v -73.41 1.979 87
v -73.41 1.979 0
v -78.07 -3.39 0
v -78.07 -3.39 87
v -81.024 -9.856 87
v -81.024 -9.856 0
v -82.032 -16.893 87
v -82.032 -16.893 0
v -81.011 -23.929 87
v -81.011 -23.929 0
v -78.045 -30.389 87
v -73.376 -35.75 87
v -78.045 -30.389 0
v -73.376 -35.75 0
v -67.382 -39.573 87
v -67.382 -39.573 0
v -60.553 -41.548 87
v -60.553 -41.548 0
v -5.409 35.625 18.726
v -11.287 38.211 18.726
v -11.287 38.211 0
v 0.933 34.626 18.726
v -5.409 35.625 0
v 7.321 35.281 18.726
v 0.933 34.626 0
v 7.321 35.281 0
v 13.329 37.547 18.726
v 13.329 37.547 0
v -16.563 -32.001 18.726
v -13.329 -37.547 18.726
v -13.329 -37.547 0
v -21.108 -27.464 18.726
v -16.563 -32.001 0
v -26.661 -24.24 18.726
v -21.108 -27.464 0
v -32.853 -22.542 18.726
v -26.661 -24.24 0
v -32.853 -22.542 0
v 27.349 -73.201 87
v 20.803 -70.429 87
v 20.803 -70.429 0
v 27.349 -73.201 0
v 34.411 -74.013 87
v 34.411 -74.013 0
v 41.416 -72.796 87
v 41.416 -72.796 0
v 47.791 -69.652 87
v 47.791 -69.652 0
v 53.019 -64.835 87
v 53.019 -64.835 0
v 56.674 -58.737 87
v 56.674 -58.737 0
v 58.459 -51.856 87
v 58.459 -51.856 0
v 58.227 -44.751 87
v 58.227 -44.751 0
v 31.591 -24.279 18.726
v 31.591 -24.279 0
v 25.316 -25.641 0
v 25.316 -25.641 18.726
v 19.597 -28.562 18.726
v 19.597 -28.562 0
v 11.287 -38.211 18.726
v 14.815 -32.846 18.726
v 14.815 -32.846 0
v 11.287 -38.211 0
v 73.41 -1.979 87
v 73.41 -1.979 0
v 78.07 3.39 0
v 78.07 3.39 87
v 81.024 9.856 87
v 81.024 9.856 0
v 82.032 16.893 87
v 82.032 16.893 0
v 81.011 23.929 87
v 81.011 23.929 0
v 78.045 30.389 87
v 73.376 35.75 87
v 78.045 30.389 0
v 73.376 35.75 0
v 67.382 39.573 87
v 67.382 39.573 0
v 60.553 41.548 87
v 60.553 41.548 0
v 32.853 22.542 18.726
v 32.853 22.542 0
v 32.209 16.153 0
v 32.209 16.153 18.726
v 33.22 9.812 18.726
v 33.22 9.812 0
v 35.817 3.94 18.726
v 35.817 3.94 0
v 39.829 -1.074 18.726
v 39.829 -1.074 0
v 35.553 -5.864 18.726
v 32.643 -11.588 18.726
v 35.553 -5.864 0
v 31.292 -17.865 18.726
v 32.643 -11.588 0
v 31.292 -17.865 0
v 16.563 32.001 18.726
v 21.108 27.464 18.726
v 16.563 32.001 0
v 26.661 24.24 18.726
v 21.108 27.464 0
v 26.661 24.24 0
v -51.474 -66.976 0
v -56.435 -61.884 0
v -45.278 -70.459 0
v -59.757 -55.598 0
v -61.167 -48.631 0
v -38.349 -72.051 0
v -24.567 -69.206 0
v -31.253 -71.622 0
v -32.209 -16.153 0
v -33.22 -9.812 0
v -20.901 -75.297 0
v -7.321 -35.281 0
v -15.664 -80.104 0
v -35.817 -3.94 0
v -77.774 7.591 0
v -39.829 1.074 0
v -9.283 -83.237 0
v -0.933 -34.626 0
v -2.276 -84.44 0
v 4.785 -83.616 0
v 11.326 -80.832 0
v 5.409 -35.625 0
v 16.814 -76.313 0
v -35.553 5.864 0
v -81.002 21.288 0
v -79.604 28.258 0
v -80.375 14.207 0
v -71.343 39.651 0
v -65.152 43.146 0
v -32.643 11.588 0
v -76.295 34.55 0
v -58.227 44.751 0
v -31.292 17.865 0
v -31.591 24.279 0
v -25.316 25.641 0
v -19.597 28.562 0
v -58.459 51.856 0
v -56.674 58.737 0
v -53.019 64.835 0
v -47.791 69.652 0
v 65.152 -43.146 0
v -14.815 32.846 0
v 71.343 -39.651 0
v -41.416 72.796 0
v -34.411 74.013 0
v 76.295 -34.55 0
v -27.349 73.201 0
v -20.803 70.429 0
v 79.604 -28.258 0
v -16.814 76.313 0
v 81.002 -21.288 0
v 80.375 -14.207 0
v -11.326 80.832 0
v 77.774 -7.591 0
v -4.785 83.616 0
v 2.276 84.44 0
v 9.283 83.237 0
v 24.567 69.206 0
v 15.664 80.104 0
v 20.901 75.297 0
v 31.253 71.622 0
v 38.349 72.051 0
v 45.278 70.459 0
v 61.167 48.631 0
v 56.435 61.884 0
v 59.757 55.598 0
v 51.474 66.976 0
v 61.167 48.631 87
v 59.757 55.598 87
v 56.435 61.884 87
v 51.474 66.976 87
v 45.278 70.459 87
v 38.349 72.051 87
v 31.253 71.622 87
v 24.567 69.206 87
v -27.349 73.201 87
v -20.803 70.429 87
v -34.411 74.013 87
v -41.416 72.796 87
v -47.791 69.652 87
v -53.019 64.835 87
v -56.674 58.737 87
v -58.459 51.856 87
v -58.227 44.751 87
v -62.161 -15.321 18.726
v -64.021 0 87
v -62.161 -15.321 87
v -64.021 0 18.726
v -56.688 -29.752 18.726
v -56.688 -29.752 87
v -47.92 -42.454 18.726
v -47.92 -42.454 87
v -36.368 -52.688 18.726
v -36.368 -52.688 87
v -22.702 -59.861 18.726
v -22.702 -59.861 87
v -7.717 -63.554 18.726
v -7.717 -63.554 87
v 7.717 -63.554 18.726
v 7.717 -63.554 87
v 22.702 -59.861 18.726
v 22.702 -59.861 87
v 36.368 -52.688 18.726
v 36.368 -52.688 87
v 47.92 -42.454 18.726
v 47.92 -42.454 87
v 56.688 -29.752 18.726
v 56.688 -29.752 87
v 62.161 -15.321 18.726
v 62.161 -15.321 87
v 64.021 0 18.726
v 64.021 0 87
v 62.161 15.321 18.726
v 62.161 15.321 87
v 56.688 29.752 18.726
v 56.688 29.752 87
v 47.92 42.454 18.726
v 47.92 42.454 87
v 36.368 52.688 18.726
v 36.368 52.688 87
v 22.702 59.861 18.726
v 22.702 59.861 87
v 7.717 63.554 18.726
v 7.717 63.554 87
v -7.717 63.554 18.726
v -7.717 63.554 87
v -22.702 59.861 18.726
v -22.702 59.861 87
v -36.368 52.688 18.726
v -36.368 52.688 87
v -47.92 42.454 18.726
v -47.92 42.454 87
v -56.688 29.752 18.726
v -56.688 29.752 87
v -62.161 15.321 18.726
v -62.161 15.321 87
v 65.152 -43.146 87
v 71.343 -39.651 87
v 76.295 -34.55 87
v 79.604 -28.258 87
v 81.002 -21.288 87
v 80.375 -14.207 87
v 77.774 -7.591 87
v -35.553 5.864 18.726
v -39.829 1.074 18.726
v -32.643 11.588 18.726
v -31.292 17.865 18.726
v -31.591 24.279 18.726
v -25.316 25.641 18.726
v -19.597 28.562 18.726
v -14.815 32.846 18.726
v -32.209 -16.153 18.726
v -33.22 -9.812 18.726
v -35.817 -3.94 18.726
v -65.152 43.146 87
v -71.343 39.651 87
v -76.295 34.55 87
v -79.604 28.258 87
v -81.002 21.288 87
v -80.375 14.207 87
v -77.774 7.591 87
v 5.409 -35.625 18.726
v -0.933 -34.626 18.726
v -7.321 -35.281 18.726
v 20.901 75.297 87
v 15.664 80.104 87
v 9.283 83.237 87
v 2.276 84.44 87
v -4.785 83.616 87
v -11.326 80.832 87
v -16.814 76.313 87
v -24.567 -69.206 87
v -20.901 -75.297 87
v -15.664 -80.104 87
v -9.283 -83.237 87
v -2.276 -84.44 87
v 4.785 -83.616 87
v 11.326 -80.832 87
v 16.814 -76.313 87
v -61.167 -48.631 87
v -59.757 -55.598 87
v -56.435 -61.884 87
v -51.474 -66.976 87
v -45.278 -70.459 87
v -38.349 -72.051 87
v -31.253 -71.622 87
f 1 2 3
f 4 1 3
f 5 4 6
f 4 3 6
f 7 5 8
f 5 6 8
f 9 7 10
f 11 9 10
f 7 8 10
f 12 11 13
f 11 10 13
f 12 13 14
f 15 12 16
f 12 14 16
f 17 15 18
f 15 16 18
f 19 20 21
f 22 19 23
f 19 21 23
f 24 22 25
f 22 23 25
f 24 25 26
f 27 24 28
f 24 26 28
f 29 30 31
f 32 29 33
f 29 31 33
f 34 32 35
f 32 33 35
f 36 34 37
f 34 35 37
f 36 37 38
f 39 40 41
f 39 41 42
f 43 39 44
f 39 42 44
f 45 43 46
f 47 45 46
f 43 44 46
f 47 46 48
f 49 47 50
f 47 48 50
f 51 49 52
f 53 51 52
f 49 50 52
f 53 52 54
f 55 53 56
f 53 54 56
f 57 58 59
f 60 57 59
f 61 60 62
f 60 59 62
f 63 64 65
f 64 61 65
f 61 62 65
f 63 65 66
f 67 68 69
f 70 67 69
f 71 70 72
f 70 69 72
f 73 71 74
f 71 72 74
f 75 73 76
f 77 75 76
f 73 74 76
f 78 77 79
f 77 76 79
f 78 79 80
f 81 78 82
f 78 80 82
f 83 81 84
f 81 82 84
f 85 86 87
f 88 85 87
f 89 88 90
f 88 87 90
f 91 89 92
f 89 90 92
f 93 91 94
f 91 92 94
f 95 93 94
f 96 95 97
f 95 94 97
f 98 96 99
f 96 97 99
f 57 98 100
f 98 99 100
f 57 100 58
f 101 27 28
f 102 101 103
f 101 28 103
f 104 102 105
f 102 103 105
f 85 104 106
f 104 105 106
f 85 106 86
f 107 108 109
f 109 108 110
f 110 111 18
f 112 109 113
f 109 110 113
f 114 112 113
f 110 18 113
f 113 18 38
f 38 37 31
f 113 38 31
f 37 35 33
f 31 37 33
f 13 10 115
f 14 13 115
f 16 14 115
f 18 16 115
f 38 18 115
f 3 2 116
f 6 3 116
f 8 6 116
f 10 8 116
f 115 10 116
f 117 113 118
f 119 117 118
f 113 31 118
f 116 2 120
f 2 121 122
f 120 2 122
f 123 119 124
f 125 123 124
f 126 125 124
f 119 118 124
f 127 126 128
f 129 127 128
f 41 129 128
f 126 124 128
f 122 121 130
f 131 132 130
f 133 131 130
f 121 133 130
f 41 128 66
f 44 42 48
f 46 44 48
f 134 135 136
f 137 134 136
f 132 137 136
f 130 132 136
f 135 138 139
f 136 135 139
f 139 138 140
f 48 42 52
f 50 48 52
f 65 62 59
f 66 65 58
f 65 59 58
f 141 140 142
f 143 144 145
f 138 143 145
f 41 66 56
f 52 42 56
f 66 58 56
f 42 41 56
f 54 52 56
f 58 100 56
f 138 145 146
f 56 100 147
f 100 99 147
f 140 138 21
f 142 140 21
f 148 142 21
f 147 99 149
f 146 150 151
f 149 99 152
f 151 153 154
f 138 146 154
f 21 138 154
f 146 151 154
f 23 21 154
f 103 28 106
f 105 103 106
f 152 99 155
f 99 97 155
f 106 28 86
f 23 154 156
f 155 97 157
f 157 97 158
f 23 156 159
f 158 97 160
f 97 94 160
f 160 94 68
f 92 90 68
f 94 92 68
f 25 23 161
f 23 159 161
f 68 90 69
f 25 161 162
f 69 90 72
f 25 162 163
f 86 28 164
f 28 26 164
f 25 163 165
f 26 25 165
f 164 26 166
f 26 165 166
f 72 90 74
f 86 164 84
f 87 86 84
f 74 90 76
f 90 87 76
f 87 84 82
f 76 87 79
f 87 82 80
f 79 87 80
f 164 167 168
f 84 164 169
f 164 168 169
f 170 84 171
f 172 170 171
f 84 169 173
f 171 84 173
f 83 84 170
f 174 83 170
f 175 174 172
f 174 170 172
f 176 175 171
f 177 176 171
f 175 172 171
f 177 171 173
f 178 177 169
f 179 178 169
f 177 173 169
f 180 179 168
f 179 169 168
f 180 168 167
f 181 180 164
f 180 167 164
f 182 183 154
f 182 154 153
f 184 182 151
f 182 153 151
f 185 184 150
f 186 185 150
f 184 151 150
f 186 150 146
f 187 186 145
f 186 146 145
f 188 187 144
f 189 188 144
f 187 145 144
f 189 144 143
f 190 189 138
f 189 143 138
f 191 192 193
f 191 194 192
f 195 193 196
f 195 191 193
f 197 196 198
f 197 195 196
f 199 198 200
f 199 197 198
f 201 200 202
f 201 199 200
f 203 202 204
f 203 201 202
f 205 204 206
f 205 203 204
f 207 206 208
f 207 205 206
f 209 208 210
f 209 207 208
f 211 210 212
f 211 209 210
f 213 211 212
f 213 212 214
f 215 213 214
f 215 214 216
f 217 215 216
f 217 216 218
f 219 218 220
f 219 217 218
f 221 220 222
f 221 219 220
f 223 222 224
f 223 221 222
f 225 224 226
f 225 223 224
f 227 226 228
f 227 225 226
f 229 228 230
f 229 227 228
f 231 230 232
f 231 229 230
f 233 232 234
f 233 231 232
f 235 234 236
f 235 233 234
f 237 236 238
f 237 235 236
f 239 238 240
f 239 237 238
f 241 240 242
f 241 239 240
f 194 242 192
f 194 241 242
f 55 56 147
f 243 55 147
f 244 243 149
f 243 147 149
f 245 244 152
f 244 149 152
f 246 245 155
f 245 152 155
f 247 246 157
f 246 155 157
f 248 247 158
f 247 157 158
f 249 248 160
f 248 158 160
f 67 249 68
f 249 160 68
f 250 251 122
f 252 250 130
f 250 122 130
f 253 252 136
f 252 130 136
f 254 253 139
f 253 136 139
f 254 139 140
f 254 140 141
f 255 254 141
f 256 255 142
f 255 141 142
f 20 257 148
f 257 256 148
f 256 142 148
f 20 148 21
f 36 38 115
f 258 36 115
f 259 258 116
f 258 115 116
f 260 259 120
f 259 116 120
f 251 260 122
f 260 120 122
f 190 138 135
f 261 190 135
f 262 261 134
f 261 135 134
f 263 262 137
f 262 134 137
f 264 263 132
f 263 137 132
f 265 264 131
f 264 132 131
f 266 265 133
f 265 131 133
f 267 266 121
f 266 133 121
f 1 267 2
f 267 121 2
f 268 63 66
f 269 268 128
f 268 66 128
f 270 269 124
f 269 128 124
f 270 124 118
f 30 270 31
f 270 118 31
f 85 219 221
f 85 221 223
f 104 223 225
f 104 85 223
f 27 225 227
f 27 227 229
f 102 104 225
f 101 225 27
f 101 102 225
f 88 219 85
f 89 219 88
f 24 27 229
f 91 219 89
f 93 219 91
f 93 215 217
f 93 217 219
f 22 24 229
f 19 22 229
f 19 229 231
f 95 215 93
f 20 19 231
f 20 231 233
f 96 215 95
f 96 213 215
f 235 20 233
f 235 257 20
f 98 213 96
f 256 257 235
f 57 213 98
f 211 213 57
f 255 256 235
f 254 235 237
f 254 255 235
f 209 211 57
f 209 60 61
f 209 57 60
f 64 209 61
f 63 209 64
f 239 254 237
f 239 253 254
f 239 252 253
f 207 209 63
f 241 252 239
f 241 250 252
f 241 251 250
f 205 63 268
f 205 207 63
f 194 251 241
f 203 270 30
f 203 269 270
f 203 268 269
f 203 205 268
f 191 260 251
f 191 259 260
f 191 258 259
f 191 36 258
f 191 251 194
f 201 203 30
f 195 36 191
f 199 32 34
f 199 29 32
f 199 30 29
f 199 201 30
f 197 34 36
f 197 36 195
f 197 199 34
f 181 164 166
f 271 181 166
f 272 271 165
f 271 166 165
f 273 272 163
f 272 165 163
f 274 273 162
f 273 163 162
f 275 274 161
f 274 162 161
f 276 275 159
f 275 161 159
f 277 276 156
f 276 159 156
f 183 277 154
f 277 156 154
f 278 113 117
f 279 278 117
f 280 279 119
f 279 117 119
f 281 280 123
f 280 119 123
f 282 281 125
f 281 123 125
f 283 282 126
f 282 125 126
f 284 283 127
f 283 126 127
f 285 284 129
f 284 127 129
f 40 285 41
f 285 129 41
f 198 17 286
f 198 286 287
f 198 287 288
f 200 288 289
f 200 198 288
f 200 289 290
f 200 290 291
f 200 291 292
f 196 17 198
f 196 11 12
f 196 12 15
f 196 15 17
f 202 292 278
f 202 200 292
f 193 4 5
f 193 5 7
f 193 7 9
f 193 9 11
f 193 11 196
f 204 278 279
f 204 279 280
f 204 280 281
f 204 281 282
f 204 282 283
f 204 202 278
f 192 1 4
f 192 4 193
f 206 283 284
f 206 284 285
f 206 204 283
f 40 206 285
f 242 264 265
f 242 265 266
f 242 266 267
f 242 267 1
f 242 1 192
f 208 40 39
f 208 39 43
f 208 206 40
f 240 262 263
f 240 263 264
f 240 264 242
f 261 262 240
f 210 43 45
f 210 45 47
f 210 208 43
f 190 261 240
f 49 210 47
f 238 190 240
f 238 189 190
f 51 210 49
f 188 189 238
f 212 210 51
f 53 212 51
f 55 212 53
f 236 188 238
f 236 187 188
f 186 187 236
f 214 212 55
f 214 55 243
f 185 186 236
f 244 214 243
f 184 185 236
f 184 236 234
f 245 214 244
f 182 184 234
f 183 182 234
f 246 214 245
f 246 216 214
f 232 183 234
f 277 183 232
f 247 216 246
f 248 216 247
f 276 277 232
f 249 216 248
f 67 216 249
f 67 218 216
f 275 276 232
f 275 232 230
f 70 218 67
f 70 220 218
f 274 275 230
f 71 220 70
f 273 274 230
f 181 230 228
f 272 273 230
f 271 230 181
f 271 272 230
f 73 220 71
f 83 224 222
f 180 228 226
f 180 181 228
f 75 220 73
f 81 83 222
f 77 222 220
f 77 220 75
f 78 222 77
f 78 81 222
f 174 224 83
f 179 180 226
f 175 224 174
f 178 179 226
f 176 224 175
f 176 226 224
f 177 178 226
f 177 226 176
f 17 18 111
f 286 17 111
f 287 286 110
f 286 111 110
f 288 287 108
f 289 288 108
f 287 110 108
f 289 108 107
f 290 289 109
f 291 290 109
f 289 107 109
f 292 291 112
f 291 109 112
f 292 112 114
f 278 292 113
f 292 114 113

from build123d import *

# Parameters (mm, degrees)
EXTRUDE_1_DEPTH = 87
SKETCH_2_W      = 30.108921009
SKETCH_2_H      = 80.924328046


with BuildPart() as part:
    # 草图1 → 凸台-拉伸1 (new body)
    with BuildSketch(Plane.XY):
        with BuildLine():
            ThreePointArc((-20.80288439, 70.428851171), (-47.791271034, 69.651792293), (-58.226927057, 44.750508842))
            ThreePointArc((-58.226927057, 44.750508842), (-79.604246754, 28.258479352), (-73.41026265, 1.978993149))
            ThreePointArc((-73.41026265, 1.978993149), (-81.011105864, -23.928612231), (-60.553373033, -41.548430663))
            ThreePointArc((-60.553373033, -41.548430663), (-51.474476, -66.975787246), (-24.567153051, -69.205766141))
            ThreePointArc((-24.567153051, -69.205766141), (-2.276345856, -84.440487955), (20.80288439, -70.428851171))
            ThreePointArc((20.80288439, -70.428851171), (47.791271034, -69.651792293), (58.226927057, -44.750508842))
            ThreePointArc((58.226927057, -44.750508842), (79.604246754, -28.258479352), (73.41026265, -1.978993149))
            ThreePointArc((73.41026265, -1.978993149), (81.011105864, 23.928612231), (60.553373033, 41.548430663))
            ThreePointArc((60.553373033, 41.548430663), (51.474476, 66.975787246), (24.567153051, 69.205766141))
            ThreePointArc((24.567153051, 69.205766141), (2.276345856, 84.440487955), (-20.80288439, 70.428851171))
        make_face()
        with BuildLine():
            ThreePointArc((-11.286570005, 38.211054977), (0.933445053, 34.625913967), (13.328867648, 37.547472247))
            ThreePointArc((13.328867648, 37.547472247), (21.107774488, 27.464287609), (32.853130891, 22.542031311))
            ThreePointArc((32.853130891, 22.542031311), (33.219651496, 9.812236861), (39.82861477, -1.073699411))
            ThreePointArc((39.82861477, -1.073699411), (32.642750726, -11.587754862), (31.590921532, -24.279313452))
            ThreePointArc((31.590921532, -24.279313452), (19.597428665, -28.561618081), (11.286570005, -38.211054977))
            ThreePointArc((11.286570005, -38.211054977), (-0.933445053, -34.625913967), (-13.328867648, -37.547472247))
            ThreePointArc((-13.328867648, -37.547472247), (-21.107774488, -27.464287609), (-32.853130891, -22.542031311))
            ThreePointArc((-32.853130891, -22.542031311), (-33.219651496, -9.812236861), (-39.82861477, 1.073699411))
            ThreePointArc((-39.82861477, 1.073699411), (-32.642750726, 11.587754862), (-31.590921532, 24.279313452))
            ThreePointArc((-31.590921532, 24.279313452), (-19.597428665, 28.561618081), (-11.286570005, 38.211054977))
        make_face(mode=Mode.SUBTRACT)
    extrude(amount=EXTRUDE_1_DEPTH)

    # 草图2 → 切除-旋转1 (revolve, cut)
    with BuildSketch(Plane(origin=(0, 0, 0), x_dir=(1, 0, 0), z_dir=(0, 1, 0))):
        with Locations((-48.966613642, -59.188332526)):
            Rectangle(SKETCH_2_W, SKETCH_2_H)
    revolve(axis=Axis((0, 0, 0), (0, 0, 1)), mode=Mode.SUBTRACT)


solid = part.part
